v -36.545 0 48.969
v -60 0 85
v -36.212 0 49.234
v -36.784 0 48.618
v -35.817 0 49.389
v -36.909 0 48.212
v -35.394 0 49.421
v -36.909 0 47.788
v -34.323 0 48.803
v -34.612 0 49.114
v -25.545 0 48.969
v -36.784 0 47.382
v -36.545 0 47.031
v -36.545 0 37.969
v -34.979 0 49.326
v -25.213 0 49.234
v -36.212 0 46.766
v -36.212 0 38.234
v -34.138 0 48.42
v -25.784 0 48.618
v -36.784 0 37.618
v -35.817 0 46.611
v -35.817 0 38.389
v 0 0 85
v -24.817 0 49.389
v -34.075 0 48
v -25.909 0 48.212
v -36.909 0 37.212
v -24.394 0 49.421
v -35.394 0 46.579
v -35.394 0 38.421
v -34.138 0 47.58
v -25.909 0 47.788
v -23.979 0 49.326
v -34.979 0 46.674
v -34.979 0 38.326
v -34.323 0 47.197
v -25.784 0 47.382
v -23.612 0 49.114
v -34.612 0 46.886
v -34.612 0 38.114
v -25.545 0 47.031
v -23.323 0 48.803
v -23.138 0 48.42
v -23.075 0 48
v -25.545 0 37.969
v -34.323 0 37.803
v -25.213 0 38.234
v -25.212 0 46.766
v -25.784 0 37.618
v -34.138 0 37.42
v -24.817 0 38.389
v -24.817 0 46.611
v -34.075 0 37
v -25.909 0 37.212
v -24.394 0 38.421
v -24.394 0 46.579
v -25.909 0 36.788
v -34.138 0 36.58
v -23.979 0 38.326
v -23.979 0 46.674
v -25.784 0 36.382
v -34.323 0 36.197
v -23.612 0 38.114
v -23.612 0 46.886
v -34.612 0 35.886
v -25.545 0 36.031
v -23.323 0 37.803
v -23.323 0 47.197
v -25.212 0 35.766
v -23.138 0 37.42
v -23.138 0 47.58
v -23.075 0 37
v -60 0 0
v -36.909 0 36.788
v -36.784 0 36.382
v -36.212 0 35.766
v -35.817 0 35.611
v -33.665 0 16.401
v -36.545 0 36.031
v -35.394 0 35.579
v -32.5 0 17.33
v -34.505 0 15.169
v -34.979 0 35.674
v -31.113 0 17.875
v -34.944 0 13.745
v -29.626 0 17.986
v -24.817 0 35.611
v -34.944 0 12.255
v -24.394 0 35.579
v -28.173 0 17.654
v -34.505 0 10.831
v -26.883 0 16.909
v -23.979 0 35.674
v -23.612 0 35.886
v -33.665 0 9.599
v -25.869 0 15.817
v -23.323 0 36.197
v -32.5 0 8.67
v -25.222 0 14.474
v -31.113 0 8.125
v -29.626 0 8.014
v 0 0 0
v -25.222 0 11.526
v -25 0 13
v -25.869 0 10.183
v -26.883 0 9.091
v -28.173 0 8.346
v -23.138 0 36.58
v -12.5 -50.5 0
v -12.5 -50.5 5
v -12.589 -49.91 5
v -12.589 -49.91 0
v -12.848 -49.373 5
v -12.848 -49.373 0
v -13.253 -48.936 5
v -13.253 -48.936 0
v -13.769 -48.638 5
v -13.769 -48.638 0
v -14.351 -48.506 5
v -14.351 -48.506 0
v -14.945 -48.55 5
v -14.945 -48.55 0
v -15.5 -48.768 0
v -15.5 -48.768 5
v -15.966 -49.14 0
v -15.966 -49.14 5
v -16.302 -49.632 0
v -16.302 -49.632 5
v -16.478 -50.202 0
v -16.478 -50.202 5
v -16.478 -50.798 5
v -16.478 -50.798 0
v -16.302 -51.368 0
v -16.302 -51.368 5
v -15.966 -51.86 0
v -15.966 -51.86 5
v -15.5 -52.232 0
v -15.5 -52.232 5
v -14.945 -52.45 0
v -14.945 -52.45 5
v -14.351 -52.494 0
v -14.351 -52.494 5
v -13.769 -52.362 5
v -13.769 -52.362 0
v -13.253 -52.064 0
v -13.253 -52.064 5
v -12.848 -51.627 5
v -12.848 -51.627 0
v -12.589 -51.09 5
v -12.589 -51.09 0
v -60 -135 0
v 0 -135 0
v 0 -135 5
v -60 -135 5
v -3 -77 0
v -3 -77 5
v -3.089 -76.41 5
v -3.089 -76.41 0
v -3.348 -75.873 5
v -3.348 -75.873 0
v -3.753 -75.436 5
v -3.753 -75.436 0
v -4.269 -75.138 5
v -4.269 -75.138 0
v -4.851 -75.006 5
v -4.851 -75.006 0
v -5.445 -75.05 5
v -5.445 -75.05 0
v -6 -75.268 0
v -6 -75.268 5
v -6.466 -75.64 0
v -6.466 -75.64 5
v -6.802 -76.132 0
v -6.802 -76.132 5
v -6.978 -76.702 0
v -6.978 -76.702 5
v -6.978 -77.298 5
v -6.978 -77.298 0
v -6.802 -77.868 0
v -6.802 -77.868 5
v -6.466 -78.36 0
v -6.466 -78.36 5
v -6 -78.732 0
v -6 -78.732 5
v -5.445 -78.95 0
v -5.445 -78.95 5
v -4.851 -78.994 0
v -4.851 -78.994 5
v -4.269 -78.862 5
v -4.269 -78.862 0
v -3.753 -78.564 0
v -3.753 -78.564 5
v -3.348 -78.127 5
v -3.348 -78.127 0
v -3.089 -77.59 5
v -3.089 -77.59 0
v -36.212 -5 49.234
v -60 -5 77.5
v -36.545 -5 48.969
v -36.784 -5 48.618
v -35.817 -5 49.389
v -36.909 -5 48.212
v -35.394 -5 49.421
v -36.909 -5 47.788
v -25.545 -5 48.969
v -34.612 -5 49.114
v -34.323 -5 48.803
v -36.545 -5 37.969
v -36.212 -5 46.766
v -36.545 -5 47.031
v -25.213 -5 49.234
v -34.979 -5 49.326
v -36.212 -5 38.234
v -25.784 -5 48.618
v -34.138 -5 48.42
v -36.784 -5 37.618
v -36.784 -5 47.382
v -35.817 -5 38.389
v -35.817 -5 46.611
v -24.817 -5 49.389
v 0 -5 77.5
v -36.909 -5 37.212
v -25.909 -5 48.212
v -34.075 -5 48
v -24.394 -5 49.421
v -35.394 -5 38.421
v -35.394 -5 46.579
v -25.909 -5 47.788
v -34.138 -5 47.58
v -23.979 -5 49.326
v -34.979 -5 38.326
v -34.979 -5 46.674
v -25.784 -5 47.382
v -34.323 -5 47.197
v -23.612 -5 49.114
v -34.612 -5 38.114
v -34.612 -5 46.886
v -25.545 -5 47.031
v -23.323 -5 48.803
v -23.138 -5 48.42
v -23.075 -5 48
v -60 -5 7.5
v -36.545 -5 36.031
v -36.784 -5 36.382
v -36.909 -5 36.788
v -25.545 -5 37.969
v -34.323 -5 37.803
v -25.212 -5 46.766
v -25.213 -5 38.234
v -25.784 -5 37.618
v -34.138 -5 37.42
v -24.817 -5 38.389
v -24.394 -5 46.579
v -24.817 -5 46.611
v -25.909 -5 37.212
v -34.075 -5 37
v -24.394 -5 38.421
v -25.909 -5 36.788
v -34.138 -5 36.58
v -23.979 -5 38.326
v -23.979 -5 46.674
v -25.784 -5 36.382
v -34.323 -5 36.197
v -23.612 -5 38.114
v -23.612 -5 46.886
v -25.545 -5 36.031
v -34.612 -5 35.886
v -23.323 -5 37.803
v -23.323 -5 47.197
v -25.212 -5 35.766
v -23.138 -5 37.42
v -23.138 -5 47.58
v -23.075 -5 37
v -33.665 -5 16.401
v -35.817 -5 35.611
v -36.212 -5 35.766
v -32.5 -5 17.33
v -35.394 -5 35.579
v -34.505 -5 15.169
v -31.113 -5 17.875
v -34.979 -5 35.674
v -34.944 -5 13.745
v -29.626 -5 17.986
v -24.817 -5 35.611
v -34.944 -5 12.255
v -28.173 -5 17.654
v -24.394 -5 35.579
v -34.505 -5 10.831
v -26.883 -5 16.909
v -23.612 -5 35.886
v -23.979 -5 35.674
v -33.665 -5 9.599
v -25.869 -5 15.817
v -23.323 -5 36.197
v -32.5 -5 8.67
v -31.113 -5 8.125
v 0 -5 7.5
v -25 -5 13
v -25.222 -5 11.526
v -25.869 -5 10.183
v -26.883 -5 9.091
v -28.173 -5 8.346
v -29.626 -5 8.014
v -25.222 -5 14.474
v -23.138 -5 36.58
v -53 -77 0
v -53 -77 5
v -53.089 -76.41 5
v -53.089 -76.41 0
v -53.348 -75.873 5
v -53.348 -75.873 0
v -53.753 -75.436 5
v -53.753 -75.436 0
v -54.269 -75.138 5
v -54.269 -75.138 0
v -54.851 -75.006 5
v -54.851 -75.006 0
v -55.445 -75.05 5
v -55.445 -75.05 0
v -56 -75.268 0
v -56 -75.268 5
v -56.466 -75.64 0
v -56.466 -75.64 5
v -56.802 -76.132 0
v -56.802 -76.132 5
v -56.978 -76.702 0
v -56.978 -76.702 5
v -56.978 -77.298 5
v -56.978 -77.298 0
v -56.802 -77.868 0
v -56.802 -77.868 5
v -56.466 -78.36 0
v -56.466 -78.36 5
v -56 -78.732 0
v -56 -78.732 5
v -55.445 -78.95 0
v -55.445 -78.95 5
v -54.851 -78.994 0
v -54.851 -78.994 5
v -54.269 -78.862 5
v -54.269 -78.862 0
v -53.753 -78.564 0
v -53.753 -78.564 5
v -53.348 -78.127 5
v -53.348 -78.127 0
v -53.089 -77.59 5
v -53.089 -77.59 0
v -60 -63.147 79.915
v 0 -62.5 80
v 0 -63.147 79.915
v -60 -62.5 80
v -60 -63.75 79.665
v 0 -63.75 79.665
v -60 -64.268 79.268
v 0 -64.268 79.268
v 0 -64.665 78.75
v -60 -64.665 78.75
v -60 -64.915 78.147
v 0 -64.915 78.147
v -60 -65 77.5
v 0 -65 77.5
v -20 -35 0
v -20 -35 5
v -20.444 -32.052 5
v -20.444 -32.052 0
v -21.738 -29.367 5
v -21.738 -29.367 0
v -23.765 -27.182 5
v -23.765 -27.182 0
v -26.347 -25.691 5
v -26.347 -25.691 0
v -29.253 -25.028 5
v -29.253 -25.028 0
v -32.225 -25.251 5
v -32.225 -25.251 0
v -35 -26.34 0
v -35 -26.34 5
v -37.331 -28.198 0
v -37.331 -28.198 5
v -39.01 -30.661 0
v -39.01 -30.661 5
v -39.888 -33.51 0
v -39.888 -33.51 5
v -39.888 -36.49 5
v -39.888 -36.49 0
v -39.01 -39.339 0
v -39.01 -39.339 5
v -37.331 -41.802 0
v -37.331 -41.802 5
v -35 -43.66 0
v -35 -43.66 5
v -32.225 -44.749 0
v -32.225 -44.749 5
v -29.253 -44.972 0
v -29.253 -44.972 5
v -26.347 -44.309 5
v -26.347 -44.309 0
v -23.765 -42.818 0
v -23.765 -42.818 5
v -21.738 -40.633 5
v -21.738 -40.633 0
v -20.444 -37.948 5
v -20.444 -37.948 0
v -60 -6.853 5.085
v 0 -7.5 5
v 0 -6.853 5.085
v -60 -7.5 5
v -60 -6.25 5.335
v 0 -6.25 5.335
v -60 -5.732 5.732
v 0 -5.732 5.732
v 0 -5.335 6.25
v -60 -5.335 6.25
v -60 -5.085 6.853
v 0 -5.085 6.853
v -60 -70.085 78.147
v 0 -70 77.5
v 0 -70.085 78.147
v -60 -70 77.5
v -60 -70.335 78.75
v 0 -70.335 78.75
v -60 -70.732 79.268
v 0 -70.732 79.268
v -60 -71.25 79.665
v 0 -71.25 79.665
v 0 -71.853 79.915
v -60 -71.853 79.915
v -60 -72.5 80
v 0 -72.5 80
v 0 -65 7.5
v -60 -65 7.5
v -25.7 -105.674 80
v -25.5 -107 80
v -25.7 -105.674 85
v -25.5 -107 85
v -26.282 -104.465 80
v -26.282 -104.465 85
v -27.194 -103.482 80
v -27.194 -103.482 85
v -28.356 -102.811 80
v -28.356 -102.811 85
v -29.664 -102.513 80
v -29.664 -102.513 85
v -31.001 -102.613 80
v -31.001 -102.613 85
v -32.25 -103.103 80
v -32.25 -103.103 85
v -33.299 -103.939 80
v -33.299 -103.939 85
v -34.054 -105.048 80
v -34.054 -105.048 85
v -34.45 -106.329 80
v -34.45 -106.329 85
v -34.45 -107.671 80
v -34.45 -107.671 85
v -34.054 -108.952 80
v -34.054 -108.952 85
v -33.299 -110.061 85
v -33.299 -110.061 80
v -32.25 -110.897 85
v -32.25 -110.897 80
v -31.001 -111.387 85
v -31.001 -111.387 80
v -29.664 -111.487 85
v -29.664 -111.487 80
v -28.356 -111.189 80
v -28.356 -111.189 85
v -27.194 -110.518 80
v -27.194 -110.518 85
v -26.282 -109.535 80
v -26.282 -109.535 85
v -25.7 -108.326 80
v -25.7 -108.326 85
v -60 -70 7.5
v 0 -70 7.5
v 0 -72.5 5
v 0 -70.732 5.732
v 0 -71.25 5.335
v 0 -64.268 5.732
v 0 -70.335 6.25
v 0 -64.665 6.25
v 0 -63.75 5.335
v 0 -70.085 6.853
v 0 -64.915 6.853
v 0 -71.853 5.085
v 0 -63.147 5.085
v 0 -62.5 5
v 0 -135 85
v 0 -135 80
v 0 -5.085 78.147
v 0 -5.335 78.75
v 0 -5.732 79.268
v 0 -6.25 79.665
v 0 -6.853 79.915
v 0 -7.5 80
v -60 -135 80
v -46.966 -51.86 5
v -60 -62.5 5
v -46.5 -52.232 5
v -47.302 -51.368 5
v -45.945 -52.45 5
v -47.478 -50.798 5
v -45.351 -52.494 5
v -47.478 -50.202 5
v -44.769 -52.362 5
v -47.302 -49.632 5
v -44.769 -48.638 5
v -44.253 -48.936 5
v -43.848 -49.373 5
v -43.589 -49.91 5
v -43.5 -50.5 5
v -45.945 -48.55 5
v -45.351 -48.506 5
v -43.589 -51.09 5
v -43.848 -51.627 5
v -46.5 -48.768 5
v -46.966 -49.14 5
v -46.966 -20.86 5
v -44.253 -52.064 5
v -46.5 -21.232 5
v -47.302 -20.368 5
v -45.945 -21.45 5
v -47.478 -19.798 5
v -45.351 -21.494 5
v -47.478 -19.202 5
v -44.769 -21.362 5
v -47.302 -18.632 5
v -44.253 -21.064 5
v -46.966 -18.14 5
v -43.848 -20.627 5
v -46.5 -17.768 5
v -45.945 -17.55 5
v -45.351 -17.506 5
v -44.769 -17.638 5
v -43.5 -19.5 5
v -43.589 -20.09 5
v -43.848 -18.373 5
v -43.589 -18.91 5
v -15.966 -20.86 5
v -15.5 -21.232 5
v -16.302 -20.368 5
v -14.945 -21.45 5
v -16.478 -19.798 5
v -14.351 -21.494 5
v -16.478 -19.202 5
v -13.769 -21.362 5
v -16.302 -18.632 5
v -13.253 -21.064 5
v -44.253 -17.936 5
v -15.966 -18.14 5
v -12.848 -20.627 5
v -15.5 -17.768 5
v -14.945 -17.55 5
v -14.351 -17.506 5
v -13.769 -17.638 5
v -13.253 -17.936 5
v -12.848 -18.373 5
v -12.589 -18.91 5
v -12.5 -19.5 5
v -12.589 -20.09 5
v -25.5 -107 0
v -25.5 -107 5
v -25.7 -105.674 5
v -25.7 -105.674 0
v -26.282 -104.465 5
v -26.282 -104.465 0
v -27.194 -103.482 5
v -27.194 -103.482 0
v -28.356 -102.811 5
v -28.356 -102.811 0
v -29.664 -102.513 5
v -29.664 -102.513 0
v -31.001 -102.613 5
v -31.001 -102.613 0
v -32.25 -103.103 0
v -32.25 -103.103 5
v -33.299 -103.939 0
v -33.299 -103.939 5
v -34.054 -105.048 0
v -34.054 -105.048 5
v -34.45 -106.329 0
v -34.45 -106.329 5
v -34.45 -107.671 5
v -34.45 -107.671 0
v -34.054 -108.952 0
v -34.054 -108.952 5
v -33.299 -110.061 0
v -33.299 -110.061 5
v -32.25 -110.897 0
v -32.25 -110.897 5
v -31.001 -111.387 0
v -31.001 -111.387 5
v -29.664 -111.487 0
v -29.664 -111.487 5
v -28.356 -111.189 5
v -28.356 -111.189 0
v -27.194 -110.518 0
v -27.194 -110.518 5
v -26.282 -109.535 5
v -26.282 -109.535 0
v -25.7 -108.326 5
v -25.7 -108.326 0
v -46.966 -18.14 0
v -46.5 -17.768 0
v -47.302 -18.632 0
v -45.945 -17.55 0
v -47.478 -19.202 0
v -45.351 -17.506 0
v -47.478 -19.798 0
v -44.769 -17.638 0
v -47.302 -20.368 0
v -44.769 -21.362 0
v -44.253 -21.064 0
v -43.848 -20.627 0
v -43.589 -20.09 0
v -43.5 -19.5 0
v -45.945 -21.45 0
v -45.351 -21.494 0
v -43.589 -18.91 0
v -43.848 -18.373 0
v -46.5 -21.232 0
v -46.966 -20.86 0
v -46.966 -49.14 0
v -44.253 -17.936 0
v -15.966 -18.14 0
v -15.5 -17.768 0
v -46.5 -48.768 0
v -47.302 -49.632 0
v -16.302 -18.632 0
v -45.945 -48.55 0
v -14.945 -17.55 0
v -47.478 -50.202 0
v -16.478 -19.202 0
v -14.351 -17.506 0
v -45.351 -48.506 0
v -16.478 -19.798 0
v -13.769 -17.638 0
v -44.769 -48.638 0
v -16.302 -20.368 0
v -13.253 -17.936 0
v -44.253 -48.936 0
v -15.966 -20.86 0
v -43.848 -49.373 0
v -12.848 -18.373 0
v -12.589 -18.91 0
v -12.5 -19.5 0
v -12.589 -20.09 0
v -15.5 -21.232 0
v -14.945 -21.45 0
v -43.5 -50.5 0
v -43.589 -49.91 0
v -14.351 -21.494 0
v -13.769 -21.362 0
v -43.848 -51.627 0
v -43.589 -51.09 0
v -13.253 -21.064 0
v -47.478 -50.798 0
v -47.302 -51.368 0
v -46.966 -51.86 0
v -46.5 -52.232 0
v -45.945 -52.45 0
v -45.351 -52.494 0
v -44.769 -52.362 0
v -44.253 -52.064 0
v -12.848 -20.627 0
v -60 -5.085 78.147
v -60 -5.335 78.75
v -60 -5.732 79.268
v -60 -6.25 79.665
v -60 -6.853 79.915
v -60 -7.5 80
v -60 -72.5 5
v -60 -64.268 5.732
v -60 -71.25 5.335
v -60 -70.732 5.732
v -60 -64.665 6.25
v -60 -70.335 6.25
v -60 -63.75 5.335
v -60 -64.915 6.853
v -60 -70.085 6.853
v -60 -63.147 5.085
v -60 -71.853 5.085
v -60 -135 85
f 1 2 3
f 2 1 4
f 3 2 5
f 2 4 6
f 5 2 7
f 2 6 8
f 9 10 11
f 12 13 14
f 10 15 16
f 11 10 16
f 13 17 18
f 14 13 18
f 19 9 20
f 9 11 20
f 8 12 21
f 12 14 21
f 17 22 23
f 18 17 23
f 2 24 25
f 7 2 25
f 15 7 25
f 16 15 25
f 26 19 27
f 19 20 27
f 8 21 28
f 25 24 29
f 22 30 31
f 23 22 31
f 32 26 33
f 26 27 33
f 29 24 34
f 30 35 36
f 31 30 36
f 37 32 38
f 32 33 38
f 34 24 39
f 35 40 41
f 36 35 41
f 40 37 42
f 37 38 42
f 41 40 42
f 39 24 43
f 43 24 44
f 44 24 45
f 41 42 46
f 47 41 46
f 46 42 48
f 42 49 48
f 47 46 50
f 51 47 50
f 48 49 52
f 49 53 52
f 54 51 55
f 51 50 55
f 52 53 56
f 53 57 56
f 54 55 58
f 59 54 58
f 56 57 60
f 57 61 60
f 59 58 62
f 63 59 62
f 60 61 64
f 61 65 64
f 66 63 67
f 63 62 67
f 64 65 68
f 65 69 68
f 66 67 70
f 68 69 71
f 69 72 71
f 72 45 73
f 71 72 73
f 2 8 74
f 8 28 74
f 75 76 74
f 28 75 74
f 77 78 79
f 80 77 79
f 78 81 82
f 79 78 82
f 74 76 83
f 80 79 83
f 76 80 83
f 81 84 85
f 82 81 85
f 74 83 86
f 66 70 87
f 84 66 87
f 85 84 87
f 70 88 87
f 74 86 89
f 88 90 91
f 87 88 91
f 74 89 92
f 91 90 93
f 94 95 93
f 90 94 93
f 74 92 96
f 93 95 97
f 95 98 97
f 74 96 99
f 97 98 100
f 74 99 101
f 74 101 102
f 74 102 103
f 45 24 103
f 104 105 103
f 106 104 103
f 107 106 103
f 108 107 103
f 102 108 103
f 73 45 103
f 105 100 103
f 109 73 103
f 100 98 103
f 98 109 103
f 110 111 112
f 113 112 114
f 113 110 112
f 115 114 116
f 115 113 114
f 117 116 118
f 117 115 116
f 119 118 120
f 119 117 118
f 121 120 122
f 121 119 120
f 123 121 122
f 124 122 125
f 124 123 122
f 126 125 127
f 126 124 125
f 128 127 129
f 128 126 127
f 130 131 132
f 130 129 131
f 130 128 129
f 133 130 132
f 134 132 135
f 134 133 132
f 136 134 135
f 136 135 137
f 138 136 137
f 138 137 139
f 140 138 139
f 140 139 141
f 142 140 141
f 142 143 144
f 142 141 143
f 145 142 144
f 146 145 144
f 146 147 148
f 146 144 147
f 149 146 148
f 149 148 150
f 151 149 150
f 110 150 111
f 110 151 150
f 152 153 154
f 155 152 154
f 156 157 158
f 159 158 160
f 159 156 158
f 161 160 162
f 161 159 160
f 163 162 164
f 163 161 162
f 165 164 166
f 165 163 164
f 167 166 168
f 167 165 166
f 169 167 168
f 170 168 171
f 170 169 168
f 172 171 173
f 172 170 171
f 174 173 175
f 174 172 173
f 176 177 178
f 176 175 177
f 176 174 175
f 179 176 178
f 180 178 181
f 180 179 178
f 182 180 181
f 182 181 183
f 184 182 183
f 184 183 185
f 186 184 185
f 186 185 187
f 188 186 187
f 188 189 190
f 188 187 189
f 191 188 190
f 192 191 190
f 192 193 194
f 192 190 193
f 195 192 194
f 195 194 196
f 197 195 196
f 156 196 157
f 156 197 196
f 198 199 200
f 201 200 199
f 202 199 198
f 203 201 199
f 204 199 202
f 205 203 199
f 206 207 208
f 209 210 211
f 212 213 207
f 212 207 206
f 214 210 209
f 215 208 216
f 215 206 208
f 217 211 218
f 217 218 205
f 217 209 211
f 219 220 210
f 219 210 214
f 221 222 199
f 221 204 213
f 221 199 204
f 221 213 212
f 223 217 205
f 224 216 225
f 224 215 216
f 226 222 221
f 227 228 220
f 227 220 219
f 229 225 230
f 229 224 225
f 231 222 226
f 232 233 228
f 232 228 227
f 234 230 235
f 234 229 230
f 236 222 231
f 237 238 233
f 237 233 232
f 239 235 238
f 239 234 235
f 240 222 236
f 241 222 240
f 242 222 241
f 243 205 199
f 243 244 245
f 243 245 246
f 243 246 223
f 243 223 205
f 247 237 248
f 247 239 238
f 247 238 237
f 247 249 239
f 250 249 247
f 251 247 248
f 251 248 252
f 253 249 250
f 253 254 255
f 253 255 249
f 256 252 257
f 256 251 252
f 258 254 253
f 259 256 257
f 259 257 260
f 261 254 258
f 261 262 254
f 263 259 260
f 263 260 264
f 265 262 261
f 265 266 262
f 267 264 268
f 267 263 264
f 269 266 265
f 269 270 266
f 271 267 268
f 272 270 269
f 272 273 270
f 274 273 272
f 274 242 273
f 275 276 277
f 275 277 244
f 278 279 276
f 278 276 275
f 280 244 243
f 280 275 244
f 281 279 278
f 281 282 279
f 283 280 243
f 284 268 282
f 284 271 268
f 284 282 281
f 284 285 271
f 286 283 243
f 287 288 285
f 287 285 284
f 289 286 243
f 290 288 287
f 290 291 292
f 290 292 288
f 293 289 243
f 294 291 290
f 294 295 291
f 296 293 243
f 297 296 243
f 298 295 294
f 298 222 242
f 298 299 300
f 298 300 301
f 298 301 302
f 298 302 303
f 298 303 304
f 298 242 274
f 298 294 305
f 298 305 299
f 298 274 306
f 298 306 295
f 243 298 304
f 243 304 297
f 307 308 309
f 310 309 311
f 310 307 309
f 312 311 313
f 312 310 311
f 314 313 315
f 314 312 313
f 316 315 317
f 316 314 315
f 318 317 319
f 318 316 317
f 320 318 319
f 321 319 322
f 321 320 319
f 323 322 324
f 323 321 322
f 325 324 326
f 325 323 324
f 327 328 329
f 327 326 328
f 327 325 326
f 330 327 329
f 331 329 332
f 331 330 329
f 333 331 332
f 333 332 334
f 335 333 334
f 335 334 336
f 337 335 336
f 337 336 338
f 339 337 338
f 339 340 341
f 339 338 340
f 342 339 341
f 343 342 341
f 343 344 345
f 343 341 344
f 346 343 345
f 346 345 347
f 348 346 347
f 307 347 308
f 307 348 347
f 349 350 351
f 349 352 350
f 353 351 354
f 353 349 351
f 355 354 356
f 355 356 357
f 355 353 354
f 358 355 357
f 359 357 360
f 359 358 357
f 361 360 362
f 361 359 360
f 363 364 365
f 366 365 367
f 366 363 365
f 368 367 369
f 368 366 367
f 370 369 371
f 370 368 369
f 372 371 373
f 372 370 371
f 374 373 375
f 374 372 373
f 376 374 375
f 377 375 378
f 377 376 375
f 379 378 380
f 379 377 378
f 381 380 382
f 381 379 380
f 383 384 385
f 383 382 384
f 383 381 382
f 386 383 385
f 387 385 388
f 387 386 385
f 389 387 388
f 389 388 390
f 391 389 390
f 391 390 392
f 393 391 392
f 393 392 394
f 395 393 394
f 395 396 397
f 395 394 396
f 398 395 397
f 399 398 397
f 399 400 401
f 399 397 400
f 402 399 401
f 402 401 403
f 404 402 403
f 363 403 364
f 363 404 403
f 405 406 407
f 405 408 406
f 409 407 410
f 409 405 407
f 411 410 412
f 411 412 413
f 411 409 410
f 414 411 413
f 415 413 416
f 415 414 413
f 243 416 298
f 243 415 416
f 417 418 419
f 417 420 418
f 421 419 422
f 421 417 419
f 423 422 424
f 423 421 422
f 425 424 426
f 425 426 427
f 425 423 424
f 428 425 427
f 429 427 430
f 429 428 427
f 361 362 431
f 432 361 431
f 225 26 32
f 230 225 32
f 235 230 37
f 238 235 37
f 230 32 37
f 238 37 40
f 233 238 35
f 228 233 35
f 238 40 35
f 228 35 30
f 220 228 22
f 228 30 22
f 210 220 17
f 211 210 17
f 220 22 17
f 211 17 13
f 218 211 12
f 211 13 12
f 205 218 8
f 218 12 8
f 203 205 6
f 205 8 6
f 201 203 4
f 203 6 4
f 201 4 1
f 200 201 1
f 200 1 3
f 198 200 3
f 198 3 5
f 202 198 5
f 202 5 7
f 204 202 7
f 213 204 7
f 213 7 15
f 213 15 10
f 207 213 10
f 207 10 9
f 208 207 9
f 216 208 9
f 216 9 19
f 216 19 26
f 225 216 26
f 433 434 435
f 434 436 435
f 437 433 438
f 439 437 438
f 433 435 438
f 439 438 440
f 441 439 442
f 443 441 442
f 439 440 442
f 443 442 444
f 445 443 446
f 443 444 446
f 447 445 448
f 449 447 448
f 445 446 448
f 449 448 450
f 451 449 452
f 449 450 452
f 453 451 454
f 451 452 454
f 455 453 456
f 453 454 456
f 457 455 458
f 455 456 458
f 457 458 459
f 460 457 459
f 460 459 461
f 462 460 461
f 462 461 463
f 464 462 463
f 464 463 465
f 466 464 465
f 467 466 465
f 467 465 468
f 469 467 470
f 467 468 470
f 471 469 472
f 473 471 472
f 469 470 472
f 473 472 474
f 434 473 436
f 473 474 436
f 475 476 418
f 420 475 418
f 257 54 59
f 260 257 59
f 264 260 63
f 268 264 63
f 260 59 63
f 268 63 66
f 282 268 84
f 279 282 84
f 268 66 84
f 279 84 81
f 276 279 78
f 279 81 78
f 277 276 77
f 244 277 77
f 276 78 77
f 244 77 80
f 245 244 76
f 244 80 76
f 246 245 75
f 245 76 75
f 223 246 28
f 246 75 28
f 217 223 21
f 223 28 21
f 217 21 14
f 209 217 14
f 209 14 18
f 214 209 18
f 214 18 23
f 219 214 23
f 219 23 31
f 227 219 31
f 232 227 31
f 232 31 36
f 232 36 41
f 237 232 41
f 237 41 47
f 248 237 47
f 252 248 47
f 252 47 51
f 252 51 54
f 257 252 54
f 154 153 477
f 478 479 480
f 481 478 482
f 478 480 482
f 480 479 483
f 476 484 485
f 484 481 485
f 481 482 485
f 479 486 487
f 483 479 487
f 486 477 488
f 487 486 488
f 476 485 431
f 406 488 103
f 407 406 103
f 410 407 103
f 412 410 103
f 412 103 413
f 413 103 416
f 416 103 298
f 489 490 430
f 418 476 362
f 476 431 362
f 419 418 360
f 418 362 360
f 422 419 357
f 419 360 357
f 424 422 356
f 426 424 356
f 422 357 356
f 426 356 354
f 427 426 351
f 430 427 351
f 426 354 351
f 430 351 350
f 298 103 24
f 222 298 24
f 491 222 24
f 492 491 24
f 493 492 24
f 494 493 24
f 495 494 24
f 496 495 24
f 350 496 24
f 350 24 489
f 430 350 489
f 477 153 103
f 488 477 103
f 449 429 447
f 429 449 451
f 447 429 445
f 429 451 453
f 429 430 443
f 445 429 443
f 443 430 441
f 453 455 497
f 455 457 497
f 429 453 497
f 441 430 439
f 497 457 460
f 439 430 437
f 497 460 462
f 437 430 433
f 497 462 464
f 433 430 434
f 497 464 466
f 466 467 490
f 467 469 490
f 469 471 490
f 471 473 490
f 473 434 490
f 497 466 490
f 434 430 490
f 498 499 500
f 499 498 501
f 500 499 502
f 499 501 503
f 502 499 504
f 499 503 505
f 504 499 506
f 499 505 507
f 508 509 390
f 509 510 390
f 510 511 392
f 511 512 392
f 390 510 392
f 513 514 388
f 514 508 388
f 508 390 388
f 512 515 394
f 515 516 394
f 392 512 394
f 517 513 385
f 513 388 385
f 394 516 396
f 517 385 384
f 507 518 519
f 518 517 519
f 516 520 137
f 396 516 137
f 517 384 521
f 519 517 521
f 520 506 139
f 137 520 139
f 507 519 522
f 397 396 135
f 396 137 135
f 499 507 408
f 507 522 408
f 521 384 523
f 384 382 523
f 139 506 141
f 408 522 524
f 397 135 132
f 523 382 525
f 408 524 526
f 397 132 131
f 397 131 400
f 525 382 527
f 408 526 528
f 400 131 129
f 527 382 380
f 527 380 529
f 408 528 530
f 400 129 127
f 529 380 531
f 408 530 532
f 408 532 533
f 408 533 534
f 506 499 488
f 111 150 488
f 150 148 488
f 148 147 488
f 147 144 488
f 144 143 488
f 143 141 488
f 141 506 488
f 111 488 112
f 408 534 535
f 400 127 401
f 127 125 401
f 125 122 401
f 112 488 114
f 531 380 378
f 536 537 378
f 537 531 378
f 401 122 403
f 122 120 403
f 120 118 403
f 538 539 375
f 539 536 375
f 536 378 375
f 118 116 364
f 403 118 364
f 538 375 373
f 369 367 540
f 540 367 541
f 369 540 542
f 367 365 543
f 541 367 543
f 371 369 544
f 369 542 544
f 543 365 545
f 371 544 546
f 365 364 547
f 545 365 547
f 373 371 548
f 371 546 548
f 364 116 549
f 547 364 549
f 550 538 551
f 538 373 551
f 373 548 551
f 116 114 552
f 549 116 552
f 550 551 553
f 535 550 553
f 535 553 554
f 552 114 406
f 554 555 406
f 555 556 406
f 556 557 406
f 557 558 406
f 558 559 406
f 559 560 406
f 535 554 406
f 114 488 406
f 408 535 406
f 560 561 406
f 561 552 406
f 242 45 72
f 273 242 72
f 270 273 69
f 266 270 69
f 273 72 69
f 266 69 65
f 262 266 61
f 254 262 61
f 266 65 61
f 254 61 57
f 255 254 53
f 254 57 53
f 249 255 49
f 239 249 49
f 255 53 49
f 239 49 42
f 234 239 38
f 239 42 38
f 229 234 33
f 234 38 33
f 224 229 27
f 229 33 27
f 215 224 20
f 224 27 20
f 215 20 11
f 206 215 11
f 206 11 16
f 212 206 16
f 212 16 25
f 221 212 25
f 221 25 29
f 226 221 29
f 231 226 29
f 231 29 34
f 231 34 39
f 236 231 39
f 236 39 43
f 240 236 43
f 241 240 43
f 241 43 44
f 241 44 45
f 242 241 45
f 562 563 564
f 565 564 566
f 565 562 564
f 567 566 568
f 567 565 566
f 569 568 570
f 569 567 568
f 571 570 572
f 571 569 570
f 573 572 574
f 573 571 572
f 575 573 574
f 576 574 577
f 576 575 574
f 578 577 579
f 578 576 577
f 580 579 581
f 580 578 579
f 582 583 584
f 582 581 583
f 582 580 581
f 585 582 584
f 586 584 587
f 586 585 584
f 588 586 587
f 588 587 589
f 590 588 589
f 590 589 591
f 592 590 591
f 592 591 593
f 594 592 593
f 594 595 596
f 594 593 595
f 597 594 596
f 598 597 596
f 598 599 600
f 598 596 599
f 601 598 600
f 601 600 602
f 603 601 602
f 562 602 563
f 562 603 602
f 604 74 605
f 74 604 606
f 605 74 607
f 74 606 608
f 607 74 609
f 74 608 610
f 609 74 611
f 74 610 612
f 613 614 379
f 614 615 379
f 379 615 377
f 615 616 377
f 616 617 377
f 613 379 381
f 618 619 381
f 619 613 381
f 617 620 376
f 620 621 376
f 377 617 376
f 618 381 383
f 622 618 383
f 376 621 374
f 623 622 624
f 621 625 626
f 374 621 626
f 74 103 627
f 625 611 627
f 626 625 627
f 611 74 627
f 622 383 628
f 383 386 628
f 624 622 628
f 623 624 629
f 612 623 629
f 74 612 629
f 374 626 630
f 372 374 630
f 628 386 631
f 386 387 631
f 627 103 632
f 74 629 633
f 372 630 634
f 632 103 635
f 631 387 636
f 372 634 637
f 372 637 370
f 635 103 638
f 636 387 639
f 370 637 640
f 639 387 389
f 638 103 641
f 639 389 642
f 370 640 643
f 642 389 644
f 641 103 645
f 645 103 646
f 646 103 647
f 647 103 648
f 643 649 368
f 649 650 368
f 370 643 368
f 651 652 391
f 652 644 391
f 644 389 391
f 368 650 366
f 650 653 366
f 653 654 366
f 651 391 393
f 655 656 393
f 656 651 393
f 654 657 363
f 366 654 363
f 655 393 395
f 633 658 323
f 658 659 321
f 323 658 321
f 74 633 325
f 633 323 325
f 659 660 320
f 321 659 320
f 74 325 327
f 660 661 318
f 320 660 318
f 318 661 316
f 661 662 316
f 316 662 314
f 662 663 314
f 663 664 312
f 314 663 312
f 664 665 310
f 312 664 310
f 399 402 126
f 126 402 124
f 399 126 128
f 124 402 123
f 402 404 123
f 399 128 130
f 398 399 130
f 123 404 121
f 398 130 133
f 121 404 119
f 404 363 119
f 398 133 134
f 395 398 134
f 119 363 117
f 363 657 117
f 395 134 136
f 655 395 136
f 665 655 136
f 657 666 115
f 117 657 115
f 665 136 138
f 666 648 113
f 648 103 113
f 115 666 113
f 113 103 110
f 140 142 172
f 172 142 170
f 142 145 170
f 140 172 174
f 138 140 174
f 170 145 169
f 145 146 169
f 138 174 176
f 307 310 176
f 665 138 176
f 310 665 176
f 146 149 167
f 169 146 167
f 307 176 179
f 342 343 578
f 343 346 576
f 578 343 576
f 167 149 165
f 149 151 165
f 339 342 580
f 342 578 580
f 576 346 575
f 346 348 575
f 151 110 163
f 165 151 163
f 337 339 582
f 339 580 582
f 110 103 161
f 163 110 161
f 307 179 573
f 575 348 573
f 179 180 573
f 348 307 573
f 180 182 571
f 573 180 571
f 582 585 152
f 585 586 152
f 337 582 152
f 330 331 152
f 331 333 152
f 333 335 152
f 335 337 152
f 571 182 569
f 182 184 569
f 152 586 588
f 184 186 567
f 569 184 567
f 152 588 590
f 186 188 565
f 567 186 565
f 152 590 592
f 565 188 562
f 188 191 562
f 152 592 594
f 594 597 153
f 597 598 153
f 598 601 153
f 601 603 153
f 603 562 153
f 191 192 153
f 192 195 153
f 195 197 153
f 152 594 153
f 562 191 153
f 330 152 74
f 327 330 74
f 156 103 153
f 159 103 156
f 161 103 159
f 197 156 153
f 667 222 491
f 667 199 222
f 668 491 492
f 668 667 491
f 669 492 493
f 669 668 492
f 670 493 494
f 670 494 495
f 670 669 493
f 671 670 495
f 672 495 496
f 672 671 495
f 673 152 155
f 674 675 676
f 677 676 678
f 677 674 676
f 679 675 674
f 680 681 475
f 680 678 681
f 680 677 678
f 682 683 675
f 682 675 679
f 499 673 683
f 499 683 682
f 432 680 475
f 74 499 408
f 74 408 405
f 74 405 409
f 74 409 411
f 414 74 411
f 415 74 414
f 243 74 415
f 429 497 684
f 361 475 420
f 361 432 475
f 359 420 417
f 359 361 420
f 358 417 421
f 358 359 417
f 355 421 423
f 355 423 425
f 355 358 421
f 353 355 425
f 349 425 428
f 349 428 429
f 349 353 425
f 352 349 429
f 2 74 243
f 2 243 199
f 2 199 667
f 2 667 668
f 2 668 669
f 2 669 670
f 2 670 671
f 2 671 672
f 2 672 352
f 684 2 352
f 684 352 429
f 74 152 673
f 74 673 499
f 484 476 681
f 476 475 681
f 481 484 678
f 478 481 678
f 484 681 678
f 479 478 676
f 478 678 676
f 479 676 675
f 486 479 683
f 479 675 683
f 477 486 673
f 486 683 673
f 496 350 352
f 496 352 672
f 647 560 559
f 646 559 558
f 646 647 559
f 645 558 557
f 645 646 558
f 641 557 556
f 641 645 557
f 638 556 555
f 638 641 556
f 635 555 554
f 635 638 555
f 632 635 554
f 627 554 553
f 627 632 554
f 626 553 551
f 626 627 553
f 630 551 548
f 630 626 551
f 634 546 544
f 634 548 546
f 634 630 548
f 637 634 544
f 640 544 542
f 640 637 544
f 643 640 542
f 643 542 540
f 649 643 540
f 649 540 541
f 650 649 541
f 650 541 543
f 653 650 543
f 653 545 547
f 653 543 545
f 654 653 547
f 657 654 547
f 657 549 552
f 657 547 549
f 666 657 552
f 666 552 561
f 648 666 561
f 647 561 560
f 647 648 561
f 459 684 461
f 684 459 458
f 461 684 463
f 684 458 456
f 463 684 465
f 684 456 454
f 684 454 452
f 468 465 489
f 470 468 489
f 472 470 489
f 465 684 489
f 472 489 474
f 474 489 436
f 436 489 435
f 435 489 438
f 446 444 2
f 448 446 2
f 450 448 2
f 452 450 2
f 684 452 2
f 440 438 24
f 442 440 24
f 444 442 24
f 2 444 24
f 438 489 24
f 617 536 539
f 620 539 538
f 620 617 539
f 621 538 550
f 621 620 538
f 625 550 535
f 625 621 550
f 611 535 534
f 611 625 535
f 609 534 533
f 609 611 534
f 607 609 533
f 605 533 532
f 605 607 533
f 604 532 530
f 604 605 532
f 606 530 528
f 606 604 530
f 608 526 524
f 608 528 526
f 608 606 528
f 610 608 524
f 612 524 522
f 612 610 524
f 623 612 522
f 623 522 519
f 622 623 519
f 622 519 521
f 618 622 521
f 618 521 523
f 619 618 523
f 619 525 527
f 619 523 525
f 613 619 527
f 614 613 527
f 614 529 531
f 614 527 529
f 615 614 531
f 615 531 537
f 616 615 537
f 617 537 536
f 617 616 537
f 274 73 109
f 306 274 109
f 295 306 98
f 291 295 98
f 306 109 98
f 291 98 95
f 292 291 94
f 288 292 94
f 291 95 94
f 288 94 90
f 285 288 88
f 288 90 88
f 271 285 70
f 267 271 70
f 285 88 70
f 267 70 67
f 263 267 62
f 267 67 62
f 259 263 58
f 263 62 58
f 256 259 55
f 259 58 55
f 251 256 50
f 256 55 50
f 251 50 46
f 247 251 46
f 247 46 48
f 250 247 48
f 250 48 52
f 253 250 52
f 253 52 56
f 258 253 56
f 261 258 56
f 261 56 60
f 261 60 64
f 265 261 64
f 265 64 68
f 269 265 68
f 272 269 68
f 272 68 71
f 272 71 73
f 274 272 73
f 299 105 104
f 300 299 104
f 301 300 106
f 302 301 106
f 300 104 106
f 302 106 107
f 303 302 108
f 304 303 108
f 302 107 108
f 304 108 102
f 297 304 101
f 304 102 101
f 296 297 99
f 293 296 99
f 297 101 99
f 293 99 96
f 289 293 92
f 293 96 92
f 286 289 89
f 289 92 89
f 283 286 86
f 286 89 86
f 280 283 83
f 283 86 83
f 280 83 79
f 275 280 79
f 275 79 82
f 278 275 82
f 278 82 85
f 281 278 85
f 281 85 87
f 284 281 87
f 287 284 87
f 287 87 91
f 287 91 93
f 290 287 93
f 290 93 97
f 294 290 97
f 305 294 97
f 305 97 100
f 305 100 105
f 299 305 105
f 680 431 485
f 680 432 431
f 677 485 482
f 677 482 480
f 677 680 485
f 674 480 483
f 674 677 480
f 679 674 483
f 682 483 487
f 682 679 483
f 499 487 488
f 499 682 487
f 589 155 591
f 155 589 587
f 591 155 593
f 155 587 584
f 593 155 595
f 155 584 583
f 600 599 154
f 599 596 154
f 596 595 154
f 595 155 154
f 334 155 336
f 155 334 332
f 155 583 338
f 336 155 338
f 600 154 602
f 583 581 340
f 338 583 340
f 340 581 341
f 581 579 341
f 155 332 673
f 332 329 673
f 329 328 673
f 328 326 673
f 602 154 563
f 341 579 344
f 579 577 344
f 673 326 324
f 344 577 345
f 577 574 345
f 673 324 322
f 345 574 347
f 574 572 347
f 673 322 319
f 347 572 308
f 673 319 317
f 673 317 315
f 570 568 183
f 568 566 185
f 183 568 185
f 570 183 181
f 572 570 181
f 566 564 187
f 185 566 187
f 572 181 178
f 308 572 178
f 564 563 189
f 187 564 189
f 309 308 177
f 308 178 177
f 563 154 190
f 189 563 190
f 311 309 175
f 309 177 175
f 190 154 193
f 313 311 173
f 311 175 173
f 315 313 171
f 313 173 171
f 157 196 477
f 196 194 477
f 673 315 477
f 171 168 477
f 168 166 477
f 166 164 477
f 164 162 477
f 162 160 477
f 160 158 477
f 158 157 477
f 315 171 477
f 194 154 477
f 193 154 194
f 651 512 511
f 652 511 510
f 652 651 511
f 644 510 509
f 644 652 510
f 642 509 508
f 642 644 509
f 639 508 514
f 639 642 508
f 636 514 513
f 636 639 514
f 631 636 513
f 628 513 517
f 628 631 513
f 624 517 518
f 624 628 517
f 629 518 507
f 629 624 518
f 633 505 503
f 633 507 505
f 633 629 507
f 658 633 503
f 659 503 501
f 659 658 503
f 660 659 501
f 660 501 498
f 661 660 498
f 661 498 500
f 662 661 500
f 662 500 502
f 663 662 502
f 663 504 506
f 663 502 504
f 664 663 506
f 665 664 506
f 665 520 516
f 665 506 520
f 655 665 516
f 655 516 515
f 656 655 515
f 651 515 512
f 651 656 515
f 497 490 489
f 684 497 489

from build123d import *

# Parameters (mm, degrees)
BOSS_EXTRUDE1_DEPTH = 60
SKETCH2_W           = 75
SKETCH2_H           = 60
CUT_EXTRUDE1_DEPTH  = 60
CUT_EXTRUDE2_REACH  = 137
SKETCH3_R           = 1.425
SKETCH3_R_2         = 5
CUT_EXTRUDE3_REACH  = 87
SKETCH4_R           = 4.5
SKETCH4_R_2         = 10
SKETCH4_R_3         = 2
FILLET1_R           = 2.5
FILLET2_R           = 2.5
FILLET3_R           = 2.5
FILLET4_R           = 2.5
FILLET5_R           = 2.5
FILLET6_R           = 2.5
CUT_EXTRUDE4_REACH  = 87
SKETCH5_R           = 4.5


with BuildPart() as part:
    # Sketch1 → Boss-Extrude1 (new body)
    with BuildSketch(Plane(origin=(0, 0, 0), x_dir=(0, 0, -1), z_dir=(1, 0, 0))):
        Polygon((0, 0), (0, -135), (-5, -135), (-5, -70), (-80, -70), (-80, -135), (-85, -135), (-85, 0), align=None)
    extrude(amount=-BOSS_EXTRUDE1_DEPTH)

    # Sketch2 → Cut-Extrude1 (cut)
    with BuildSketch(Plane(origin=(0, 0, 0), x_dir=(0, 0, -1), z_dir=(1, 0, 0))):
        with Locations((-42.5, -35)):
            Rectangle(SKETCH2_W, SKETCH2_H)
    extrude(amount=-CUT_EXTRUDE1_DEPTH, mode=Mode.SUBTRACT)

    # Sketch3 → Cut-Extrude2 (cut, up to next)
    with BuildSketch(Plane(origin=(0, 0, 0), x_dir=(1, 0, 0), z_dir=(0, 1, 0)), mode=Mode.PRIVATE) as cut_extrude2_sk1:
        with Locations((-35.5, -37)):
            Circle(SKETCH3_R)
    cut_extrude2_tool1 = extrude(cut_extrude2_sk1.sketch, amount=-CUT_EXTRUDE2_REACH, mode=Mode.PRIVATE) & part.part
    add(cut_extrude2_tool1.solids().sort_by_distance((-35.5, 0, 37))[0], mode=Mode.SUBTRACT)
    # Sketch3 → Cut-Extrude2 (cut, up to next)
    with BuildSketch(Plane(origin=(0, 0, 0), x_dir=(1, 0, 0), z_dir=(0, 1, 0)), mode=Mode.PRIVATE) as cut_extrude2_sk2:
        with Locations((-24.5, -37)):
            Circle(SKETCH3_R)
    cut_extrude2_tool2 = extrude(cut_extrude2_sk2.sketch, amount=-CUT_EXTRUDE2_REACH, mode=Mode.PRIVATE) & part.part
    add(cut_extrude2_tool2.solids().sort_by_distance((-24.5, 0, 37))[0], mode=Mode.SUBTRACT)
    # Sketch3 → Cut-Extrude2 (cut, up to next)
    with BuildSketch(Plane(origin=(0, 0, 0), x_dir=(1, 0, 0), z_dir=(0, 1, 0)), mode=Mode.PRIVATE) as cut_extrude2_sk3:
        with Locations((-24.5, -48)):
            Circle(SKETCH3_R)
    cut_extrude2_tool3 = extrude(cut_extrude2_sk3.sketch, amount=-CUT_EXTRUDE2_REACH, mode=Mode.PRIVATE) & part.part
    add(cut_extrude2_tool3.solids().sort_by_distance((-24.5, 0, 48))[0], mode=Mode.SUBTRACT)
    # Sketch3 → Cut-Extrude2 (cut, up to next)
    with BuildSketch(Plane(origin=(0, 0, 0), x_dir=(1, 0, 0), z_dir=(0, 1, 0)), mode=Mode.PRIVATE) as cut_extrude2_sk4:
        with Locations((-35.5, -48)):
            Circle(SKETCH3_R)
    cut_extrude2_tool4 = extrude(cut_extrude2_sk4.sketch, amount=-CUT_EXTRUDE2_REACH, mode=Mode.PRIVATE) & part.part
    add(cut_extrude2_tool4.solids().sort_by_distance((-35.5, 0, 48))[0], mode=Mode.SUBTRACT)
    # Sketch3 → Cut-Extrude2 (cut, up to next)
    with BuildSketch(Plane(origin=(0, 0, 0), x_dir=(1, 0, 0), z_dir=(0, 1, 0)), mode=Mode.PRIVATE) as cut_extrude2_sk5:
        with Locations((-30, -13)):
            Circle(SKETCH3_R_2)
    cut_extrude2_tool5 = extrude(cut_extrude2_sk5.sketch, amount=-CUT_EXTRUDE2_REACH, mode=Mode.PRIVATE) & part.part
    add(cut_extrude2_tool5.solids().sort_by_distance((-30, 0, 13))[0], mode=Mode.SUBTRACT)

    # Sketch4 → Cut-Extrude3 (cut, up to next)
    with BuildSketch(Plane.XY, mode=Mode.PRIVATE) as cut_extrude3_sk1:
        with Locations((-30, -107)):
            Circle(SKETCH4_R)
    cut_extrude3_tool1 = extrude(cut_extrude3_sk1.sketch, amount=CUT_EXTRUDE3_REACH, mode=Mode.PRIVATE) & part.part
    add(cut_extrude3_tool1.solids().sort_by_distance((-30, -107, 0))[0], mode=Mode.SUBTRACT)
    # Sketch4 → Cut-Extrude3 (cut, up to next)
    with BuildSketch(Plane.XY, mode=Mode.PRIVATE) as cut_extrude3_sk2:
        with Locations((-30, -35)):
            Circle(SKETCH4_R_2)
    cut_extrude3_tool2 = extrude(cut_extrude3_sk2.sketch, amount=CUT_EXTRUDE3_REACH, mode=Mode.PRIVATE) & part.part
    add(cut_extrude3_tool2.solids().sort_by_distance((-30, -35, 0))[0], mode=Mode.SUBTRACT)
    # Sketch4 → Cut-Extrude3 (cut, up to next)
    with BuildSketch(Plane.XY, mode=Mode.PRIVATE) as cut_extrude3_sk3:
        with Locations((-5, -77)):
            Circle(SKETCH4_R_3)
    cut_extrude3_tool3 = extrude(cut_extrude3_sk3.sketch, amount=CUT_EXTRUDE3_REACH, mode=Mode.PRIVATE) & part.part
    add(cut_extrude3_tool3.solids().sort_by_distance((-5, -77, 0))[0], mode=Mode.SUBTRACT)
    # Sketch4 → Cut-Extrude3 (cut, up to next)
    with BuildSketch(Plane.XY, mode=Mode.PRIVATE) as cut_extrude3_sk4:
        with Locations((-55, -77)):
            Circle(SKETCH4_R_3)
    cut_extrude3_tool4 = extrude(cut_extrude3_sk4.sketch, amount=CUT_EXTRUDE3_REACH, mode=Mode.PRIVATE) & part.part
    add(cut_extrude3_tool4.solids().sort_by_distance((-55, -77, 0))[0], mode=Mode.SUBTRACT)
    # Sketch4 → Cut-Extrude3 (cut, up to next)
    with BuildSketch(Plane.XY, mode=Mode.PRIVATE) as cut_extrude3_sk5:
        with Locations((-14.5, -19.5)):
            Circle(SKETCH4_R_3)
    cut_extrude3_tool5 = extrude(cut_extrude3_sk5.sketch, amount=CUT_EXTRUDE3_REACH, mode=Mode.PRIVATE) & part.part
    add(cut_extrude3_tool5.solids().sort_by_distance((-14.5, -19.5, 0))[0], mode=Mode.SUBTRACT)
    # Sketch4 → Cut-Extrude3 (cut, up to next)
    with BuildSketch(Plane.XY, mode=Mode.PRIVATE) as cut_extrude3_sk6:
        with Locations((-45.5, -19.5)):
            Circle(SKETCH4_R_3)
    cut_extrude3_tool6 = extrude(cut_extrude3_sk6.sketch, amount=CUT_EXTRUDE3_REACH, mode=Mode.PRIVATE) & part.part
    add(cut_extrude3_tool6.solids().sort_by_distance((-45.5, -19.5, 0))[0], mode=Mode.SUBTRACT)
    # Sketch4 → Cut-Extrude3 (cut, up to next)
    with BuildSketch(Plane.XY, mode=Mode.PRIVATE) as cut_extrude3_sk7:
        with Locations((-45.5, -50.5)):
            Circle(SKETCH4_R_3)
    cut_extrude3_tool7 = extrude(cut_extrude3_sk7.sketch, amount=CUT_EXTRUDE3_REACH, mode=Mode.PRIVATE) & part.part
    add(cut_extrude3_tool7.solids().sort_by_distance((-45.5, -50.5, 0))[0], mode=Mode.SUBTRACT)
    # Sketch4 → Cut-Extrude3 (cut, up to next)
    with BuildSketch(Plane.XY, mode=Mode.PRIVATE) as cut_extrude3_sk8:
        with Locations((-14.5, -50.5)):
            Circle(SKETCH4_R_3)
    cut_extrude3_tool8 = extrude(cut_extrude3_sk8.sketch, amount=CUT_EXTRUDE3_REACH, mode=Mode.PRIVATE) & part.part
    add(cut_extrude3_tool8.solids().sort_by_distance((-14.5, -50.5, 0))[0], mode=Mode.SUBTRACT)

    # Fillet1
    fillet1_edges = [part.edges().sort_by_distance(p)[0] for p in [
        (-30, -70, 80),
    ]]
    fillet(fillet1_edges, radius=FILLET1_R)

    # Fillet2
    fillet2_edges = [part.edges().sort_by_distance(p)[0] for p in [
        (-30, -70, 5),
    ]]
    fillet(fillet2_edges, radius=FILLET2_R)

    # Fillet3
    fillet3_edges = [part.edges().sort_by_distance(p)[0] for p in [
        (-30, -65, 80),
    ]]
    fillet(fillet3_edges, radius=FILLET3_R)

    # Fillet4
    fillet4_edges = [part.edges().sort_by_distance(p)[0] for p in [
        (-30, -65, 5),
    ]]
    fillet(fillet4_edges, radius=FILLET4_R)

    # Fillet5
    fillet5_edges = [part.edges().sort_by_distance(p)[0] for p in [
        (-30, -5, 5),
    ]]
    fillet(fillet5_edges, radius=FILLET5_R)

    # Fillet6
    fillet6_edges = [part.edges().sort_by_distance(p)[0] for p in [
        (-30, -5, 80),
    ]]
    fillet(fillet6_edges, radius=FILLET6_R)

    # Sketch5 → Cut-Extrude4 (cut, up to next)
    with BuildSketch(Plane.XY.offset(85), mode=Mode.PRIVATE) as cut_extrude4_sk1:
        with Locations((-30, -107)):
            Circle(SKETCH5_R)
    cut_extrude4_tool1 = extrude(cut_extrude4_sk1.sketch, amount=-CUT_EXTRUDE4_REACH, mode=Mode.PRIVATE) & part.part
    add(cut_extrude4_tool1.solids().sort_by_distance((-30, -107, 85))[0], mode=Mode.SUBTRACT)


solid = part.part
